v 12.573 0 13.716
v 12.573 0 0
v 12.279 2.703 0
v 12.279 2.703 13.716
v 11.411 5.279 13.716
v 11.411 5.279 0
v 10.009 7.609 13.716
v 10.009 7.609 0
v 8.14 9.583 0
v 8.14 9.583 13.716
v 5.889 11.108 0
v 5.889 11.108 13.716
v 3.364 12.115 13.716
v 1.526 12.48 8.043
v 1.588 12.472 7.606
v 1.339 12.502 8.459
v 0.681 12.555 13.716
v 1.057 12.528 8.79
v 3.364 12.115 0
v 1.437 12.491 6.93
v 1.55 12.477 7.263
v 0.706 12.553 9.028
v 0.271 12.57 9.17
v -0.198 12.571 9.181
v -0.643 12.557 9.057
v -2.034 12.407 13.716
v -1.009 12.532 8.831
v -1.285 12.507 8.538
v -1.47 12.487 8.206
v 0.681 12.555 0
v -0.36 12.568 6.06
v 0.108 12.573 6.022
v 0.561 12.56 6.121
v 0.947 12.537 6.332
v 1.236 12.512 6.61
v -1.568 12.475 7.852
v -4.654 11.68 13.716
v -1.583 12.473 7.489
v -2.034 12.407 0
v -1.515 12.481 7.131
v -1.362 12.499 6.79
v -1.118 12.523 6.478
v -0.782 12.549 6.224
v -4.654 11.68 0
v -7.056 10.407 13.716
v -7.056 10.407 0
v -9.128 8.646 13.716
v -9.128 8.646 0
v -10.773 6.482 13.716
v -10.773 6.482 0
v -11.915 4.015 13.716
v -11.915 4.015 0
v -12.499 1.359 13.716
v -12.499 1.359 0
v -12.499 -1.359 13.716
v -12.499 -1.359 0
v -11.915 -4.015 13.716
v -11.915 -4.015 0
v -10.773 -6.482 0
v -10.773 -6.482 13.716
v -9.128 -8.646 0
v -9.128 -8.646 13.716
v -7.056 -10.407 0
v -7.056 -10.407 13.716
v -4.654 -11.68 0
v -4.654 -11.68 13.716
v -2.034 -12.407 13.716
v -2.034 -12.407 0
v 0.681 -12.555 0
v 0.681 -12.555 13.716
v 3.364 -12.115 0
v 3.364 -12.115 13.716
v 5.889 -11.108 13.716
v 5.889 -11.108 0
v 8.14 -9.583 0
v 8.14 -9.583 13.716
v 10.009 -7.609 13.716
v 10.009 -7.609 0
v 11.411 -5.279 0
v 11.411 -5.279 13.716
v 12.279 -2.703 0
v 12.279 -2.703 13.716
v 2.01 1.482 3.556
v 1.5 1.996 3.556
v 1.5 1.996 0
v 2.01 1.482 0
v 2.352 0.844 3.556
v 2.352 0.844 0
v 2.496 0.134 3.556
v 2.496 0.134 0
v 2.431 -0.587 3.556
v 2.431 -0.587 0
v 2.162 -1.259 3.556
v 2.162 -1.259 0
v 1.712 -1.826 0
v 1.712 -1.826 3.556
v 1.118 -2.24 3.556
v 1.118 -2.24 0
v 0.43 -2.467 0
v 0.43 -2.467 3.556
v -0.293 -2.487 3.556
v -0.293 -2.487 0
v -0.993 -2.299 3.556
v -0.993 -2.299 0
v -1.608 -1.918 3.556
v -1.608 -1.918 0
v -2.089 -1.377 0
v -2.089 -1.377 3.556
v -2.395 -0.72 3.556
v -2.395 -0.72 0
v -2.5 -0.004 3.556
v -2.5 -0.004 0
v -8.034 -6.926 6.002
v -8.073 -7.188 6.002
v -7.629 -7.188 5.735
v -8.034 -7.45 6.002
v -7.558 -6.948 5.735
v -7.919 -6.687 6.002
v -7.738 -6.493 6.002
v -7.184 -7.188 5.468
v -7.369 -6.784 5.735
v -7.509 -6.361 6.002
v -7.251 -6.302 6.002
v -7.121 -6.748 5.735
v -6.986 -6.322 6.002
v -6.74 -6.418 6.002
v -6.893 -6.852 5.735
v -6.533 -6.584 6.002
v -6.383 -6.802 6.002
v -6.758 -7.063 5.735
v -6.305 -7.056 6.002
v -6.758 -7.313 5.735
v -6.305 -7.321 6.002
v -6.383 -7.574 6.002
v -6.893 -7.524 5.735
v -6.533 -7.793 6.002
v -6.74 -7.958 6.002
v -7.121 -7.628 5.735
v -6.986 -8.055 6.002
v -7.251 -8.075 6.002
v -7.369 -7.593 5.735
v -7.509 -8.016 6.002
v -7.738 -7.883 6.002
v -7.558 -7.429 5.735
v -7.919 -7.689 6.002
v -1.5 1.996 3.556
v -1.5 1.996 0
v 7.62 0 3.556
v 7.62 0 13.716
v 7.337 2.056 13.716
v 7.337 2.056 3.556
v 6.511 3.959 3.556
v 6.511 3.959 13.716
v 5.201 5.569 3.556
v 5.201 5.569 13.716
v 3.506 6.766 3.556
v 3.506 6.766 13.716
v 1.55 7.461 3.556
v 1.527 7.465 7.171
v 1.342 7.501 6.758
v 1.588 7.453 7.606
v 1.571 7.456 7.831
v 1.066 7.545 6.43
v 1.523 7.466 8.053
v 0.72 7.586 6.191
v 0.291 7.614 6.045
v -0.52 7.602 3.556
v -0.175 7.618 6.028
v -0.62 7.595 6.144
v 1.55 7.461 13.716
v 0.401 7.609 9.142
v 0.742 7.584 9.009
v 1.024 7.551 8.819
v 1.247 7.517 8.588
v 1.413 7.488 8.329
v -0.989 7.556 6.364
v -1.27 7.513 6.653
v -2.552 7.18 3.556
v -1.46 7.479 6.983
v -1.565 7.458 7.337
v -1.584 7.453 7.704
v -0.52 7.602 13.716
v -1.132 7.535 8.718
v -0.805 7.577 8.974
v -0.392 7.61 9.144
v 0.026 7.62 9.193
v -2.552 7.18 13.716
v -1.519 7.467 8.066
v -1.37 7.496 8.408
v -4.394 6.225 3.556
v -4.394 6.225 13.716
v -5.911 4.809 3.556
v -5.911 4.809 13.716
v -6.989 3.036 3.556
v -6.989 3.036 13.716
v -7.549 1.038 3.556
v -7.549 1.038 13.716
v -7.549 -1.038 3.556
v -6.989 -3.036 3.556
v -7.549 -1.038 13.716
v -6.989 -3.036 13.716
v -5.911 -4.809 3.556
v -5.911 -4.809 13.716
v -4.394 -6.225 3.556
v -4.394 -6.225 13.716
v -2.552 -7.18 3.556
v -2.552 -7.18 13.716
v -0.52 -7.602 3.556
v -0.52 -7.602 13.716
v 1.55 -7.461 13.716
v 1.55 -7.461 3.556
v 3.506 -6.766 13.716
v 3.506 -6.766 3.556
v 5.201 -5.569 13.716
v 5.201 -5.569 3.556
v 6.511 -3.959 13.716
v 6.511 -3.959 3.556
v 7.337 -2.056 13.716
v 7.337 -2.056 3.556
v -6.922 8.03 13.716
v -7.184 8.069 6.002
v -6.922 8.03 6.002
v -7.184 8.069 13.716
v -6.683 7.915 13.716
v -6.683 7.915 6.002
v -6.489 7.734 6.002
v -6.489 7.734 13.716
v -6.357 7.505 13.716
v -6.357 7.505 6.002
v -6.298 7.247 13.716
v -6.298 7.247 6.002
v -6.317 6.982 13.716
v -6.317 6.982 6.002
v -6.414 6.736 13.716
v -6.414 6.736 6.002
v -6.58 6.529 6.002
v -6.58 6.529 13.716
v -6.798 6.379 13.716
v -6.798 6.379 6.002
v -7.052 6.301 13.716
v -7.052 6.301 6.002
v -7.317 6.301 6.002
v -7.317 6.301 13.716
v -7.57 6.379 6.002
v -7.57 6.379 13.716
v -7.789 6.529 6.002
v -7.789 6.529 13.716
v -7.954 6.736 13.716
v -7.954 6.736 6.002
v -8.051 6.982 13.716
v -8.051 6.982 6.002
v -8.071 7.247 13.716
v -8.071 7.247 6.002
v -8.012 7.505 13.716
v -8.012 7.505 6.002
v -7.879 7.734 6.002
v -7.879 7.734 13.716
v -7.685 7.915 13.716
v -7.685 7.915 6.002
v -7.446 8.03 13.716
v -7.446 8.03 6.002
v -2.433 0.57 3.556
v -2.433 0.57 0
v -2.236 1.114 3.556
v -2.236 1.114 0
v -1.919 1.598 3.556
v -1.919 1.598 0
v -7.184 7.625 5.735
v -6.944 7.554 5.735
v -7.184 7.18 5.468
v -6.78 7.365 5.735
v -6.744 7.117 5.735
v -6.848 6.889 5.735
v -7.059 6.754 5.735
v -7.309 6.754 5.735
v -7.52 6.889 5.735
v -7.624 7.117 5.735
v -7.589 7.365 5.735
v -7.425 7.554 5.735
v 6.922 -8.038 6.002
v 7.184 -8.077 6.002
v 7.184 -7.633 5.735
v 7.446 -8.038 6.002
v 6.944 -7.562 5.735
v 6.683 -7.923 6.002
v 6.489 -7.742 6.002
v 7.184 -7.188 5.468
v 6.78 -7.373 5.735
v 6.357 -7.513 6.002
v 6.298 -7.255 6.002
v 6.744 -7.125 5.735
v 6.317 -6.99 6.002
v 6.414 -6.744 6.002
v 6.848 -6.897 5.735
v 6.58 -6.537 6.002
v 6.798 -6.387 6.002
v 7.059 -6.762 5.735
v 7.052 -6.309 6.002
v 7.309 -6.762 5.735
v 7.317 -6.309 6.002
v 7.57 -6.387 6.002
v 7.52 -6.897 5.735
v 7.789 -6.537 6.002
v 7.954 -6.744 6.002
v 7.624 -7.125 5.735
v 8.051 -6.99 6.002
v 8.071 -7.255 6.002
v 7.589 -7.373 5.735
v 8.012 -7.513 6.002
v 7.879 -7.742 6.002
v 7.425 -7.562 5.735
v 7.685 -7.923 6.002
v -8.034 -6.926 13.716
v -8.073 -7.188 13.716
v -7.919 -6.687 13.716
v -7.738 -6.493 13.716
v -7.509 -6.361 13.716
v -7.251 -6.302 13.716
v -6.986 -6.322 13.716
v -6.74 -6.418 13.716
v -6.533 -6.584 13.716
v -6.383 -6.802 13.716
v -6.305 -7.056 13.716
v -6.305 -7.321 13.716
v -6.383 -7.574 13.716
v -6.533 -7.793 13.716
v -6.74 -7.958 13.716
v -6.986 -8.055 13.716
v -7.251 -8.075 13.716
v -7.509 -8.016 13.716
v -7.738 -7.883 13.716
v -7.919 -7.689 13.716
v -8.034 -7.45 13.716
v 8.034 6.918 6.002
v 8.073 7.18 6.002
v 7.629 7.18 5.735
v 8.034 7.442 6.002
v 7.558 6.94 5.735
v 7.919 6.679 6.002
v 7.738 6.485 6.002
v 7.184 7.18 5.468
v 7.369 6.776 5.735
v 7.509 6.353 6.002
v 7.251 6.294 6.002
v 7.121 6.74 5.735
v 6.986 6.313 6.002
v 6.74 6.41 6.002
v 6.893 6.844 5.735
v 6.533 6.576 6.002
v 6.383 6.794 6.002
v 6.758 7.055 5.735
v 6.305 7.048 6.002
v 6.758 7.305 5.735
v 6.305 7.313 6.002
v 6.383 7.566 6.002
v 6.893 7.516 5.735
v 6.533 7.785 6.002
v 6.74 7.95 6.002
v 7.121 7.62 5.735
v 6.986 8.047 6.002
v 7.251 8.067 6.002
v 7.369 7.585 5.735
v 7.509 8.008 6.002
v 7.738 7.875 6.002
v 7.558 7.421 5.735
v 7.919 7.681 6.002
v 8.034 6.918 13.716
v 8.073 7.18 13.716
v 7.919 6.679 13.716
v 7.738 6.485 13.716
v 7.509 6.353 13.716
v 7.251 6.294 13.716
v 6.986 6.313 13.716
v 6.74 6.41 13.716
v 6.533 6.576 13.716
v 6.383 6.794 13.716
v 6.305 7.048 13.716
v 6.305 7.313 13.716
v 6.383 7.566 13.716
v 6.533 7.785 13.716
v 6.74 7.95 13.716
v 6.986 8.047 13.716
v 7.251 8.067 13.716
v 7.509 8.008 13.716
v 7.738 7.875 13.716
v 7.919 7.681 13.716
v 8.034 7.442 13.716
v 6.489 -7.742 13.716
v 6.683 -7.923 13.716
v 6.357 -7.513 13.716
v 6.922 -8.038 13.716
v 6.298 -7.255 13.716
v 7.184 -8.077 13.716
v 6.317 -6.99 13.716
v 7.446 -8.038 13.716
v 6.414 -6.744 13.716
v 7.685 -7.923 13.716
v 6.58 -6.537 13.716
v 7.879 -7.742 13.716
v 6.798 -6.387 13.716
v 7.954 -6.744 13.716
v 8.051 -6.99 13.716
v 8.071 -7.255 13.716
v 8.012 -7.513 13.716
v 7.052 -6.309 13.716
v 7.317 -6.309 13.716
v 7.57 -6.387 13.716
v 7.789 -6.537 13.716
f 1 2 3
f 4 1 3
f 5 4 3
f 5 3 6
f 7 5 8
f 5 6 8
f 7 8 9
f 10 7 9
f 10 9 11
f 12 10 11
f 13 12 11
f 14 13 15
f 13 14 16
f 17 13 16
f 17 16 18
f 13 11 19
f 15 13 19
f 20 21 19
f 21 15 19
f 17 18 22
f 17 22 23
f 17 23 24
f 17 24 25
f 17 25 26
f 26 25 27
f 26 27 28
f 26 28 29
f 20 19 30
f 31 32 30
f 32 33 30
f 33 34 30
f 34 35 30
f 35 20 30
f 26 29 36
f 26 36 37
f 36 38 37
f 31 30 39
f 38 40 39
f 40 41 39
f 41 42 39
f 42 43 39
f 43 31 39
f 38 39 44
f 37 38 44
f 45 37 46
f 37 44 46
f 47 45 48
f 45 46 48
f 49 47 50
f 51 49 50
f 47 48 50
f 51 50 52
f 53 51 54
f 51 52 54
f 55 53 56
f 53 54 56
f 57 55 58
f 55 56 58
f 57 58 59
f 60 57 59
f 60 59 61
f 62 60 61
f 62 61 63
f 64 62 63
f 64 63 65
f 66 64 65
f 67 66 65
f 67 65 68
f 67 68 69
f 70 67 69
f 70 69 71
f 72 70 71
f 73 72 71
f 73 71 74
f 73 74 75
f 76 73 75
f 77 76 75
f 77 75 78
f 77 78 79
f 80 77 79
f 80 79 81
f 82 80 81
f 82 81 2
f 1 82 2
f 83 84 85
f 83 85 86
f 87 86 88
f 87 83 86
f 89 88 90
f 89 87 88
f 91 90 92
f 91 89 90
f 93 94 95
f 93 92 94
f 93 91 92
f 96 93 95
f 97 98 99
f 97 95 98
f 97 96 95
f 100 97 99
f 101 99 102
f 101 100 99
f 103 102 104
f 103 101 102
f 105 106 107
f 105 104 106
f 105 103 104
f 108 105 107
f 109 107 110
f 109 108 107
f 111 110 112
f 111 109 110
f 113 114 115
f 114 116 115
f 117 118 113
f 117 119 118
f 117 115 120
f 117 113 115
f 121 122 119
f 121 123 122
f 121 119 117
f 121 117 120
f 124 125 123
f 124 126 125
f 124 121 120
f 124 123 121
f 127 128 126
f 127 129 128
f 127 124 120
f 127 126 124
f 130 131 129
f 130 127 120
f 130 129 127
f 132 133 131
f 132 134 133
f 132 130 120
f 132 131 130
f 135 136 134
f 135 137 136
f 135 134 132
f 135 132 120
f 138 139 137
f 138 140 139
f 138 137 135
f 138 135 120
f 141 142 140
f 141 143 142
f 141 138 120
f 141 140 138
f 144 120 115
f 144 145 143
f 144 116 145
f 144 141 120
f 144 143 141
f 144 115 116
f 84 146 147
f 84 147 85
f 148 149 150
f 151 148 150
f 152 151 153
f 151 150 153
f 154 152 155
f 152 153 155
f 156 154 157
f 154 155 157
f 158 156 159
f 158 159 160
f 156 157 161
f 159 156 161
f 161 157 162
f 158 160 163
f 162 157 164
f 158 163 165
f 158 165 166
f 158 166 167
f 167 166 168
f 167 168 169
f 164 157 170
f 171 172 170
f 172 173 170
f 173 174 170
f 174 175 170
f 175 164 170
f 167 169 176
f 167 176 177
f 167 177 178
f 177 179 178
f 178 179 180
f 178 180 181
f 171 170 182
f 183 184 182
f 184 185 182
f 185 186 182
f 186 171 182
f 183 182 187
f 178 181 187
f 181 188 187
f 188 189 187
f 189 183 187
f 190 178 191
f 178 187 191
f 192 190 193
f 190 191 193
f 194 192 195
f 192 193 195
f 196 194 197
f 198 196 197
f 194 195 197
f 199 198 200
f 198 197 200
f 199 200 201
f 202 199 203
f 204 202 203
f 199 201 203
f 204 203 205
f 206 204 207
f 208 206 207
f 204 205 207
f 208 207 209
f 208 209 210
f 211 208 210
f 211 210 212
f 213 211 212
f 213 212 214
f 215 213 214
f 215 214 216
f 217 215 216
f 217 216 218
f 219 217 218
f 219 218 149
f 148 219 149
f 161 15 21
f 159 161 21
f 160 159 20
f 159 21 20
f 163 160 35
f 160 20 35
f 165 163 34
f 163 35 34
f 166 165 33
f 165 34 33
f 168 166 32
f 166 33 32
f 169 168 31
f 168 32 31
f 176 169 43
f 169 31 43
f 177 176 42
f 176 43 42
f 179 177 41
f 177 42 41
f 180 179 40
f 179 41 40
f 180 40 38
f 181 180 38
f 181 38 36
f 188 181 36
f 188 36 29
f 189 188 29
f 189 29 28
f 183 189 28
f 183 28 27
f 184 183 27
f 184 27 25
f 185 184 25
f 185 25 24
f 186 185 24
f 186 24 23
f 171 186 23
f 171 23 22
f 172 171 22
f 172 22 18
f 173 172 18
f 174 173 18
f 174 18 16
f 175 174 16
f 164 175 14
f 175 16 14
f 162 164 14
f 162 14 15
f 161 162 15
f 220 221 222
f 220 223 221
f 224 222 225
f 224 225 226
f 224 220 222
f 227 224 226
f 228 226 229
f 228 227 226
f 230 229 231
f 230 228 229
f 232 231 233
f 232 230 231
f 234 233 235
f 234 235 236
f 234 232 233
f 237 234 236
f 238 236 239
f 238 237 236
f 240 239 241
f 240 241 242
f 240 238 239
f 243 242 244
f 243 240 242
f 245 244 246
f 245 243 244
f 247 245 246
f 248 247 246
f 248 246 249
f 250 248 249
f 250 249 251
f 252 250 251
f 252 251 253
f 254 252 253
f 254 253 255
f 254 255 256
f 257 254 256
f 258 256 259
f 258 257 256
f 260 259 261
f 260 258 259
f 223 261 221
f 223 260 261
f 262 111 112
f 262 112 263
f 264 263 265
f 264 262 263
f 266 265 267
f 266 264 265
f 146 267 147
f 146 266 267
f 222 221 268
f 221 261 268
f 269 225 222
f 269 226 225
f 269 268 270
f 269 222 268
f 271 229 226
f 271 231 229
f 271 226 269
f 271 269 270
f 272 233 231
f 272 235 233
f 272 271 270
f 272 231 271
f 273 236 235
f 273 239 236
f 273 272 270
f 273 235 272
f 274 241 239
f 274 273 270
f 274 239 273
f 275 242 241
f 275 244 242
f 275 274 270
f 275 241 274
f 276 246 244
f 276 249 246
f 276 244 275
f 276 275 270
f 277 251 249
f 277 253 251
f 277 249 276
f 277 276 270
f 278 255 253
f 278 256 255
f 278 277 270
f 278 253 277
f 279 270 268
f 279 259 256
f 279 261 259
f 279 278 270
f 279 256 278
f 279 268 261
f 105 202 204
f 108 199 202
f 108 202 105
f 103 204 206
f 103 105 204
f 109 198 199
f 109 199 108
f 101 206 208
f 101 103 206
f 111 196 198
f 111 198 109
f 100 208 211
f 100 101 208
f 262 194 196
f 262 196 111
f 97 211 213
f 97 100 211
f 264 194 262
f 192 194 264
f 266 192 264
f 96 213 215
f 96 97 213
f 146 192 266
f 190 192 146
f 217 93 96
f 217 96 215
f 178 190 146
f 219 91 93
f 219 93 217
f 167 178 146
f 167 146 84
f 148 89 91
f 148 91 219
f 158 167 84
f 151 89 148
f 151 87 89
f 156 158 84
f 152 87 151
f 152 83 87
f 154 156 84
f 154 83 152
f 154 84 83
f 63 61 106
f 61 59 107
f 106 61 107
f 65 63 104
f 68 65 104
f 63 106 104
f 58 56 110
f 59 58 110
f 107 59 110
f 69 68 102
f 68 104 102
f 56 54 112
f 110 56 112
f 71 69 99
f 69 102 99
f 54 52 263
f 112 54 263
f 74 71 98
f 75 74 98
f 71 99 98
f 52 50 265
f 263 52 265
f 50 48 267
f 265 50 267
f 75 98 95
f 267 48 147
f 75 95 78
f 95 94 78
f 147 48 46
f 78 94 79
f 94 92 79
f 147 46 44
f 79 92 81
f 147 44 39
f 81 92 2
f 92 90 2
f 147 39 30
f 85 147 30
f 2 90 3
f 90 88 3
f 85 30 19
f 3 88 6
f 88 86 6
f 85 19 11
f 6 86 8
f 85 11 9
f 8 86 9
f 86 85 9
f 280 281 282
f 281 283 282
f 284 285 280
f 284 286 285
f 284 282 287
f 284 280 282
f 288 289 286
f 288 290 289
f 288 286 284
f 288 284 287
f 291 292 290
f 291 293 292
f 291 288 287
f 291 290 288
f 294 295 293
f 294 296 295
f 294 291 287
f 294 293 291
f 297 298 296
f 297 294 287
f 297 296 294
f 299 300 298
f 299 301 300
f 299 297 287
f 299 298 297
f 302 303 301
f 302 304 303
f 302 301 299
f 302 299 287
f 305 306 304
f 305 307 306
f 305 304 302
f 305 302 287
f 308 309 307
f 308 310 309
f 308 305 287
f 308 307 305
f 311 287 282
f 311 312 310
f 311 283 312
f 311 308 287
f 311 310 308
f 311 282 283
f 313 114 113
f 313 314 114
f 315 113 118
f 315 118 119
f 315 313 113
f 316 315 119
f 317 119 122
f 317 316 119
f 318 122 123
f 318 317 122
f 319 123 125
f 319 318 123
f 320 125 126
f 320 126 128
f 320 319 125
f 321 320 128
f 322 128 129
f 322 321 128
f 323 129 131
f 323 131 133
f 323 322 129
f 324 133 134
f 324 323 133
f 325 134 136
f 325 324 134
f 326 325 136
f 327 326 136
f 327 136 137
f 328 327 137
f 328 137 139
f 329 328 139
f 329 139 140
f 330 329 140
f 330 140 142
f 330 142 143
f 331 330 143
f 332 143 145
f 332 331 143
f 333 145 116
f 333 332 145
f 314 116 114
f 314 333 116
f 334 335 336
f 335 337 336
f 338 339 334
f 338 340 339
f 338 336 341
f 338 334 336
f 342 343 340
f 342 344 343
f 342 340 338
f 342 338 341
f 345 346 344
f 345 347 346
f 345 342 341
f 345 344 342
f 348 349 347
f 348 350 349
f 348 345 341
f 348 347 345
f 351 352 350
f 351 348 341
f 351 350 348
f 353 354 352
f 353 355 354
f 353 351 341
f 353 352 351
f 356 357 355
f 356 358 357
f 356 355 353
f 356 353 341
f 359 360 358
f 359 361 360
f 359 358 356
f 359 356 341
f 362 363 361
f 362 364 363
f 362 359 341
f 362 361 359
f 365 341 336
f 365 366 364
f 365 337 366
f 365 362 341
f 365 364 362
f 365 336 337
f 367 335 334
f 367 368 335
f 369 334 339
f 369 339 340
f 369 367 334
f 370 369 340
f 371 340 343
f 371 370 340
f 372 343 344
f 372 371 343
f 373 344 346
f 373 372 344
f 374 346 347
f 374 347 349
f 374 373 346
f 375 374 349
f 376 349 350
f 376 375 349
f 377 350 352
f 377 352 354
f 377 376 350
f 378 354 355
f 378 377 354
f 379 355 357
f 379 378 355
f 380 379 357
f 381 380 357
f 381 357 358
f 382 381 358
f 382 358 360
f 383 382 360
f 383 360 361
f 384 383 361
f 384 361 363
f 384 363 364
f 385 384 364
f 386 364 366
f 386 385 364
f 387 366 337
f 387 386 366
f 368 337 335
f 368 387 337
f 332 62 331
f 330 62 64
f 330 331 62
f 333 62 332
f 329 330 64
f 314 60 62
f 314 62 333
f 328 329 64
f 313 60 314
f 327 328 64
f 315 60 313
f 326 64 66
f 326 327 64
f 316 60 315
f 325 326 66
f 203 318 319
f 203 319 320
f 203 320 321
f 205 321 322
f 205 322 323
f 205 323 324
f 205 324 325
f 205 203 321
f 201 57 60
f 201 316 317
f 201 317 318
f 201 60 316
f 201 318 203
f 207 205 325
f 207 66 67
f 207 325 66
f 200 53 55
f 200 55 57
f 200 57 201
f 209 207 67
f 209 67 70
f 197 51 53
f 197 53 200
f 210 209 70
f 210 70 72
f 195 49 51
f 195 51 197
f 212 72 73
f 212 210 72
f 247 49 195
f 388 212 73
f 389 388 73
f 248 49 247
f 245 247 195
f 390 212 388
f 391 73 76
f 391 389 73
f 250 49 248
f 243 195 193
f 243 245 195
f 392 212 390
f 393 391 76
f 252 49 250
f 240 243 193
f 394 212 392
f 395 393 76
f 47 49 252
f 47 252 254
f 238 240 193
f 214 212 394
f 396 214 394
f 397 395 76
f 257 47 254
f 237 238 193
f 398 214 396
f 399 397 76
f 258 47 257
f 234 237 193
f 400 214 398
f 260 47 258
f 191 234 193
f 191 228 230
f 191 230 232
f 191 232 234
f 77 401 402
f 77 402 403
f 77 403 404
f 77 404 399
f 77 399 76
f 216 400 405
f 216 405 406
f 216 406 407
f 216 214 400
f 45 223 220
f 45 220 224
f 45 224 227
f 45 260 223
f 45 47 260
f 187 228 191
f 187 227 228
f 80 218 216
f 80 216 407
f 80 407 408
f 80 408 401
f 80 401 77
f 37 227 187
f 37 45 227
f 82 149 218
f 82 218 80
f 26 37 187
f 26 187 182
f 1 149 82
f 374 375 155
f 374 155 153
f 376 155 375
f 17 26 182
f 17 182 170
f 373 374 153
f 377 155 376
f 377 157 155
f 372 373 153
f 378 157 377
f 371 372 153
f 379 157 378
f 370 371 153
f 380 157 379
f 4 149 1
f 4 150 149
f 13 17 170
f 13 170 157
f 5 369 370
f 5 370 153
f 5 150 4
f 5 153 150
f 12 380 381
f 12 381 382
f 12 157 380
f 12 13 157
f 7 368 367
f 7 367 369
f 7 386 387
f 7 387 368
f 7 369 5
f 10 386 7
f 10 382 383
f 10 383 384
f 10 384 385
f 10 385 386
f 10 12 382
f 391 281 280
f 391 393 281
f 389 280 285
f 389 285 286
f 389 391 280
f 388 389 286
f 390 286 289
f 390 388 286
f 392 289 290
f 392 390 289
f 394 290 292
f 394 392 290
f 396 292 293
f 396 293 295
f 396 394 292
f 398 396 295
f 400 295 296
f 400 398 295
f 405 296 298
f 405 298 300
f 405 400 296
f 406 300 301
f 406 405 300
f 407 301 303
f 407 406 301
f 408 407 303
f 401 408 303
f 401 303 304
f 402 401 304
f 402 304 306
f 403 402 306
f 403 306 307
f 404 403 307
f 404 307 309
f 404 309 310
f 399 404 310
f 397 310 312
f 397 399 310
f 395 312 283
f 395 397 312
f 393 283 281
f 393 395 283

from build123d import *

# Parameters (mm, degrees)
SKETCH1_R                       = 12.573
BOSS_EXTRUDE1_DEPTH             = 13.716
SKETCH2_R                       = 7.62
CUT_EXTRUDE1_DEPTH              = 10.16
F_1_8_0_1250_DOWEL_HOLE1_REACH  = 31.128
F_1_8_0_1250_DOWEL_HOLE1_BORE_R = 1.5875
CUT_EXTRUDE3_DEPTH              = 10
CUT_EXTRUDE3_DEPTH_BACK         = 10.16
CIRPATTERN1_COUNT               = 4


with BuildPart() as part:
    # Sketch1 → Boss-Extrude1 (new body)
    with BuildSketch(Plane.XY):
        Circle(SKETCH1_R)
    extrude(amount=BOSS_EXTRUDE1_DEPTH)

    # Sketch2 → Cut-Extrude1 (cut)
    with BuildSketch(Plane.XY.offset(13.716)):
        Circle(SKETCH2_R)
    extrude(amount=-CUT_EXTRUDE1_DEPTH, mode=Mode.SUBTRACT)

    # 1/8 (0.1250) Dowel Hole1 bore → 1/8 (0.1250) Dowel Hole1 (cut, up to next)
    with BuildSketch(Plane(origin=(0, 12.573, 7.62), x_dir=(1, 0, 0), z_dir=(0, 1, 0)), mode=Mode.PRIVATE) as f_1_8_0_1250_dowel_hole1_sk1:
        with Locations((0, 0.014313547)):
            Circle(F_1_8_0_1250_DOWEL_HOLE1_BORE_R)
    f_1_8_0_1250_dowel_hole1_tool1 = extrude(f_1_8_0_1250_dowel_hole1_sk1.sketch, amount=-F_1_8_0_1250_DOWEL_HOLE1_REACH, mode=Mode.PRIVATE) & part.part
    add(f_1_8_0_1250_dowel_hole1_tool1.solids().sort_by_distance((0, 12.573, 7.605686))[0], mode=Mode.SUBTRACT)

    # Sketch5 → Cut-Extrude3 (cut, two sides)
    with BuildSketch(Plane(origin=(0, 0, 7.62), x_dir=(-1, 0, 0), z_dir=(0, 0, -1))) as cut_extrude3_sk:
        with BuildLine():
            Line((1.5, 1.99598875), (-1.5, 1.99598875))
            ThreePointArc((-1.5, 1.99598875), (-1.118033989, -2.240079228), (2.5, -0.00401125))
            ThreePointArc((2.5, -0.00401125), (2.236067977, 1.114022739), (1.5, 1.99598875))
        make_face()
    extrude(amount=CUT_EXTRUDE3_DEPTH, mode=Mode.SUBTRACT)
    extrude(cut_extrude3_sk.sketch, amount=-CUT_EXTRUDE3_DEPTH_BACK, mode=Mode.SUBTRACT)

    # Sketch15 → #2-56 Tapped Hole1 (revolve, cut)
    with BuildSketch(Plane(origin=(7.184204897, -7.188216147, 13.716), x_dir=(0, -1, 0), z_dir=(1, 0, 0))):
        Polygon((0, 0), (0, 8.24814509), (0.889, 7.71398), (0.889, 0), align=None)
    f_2_56_tapped_hole1 = revolve(axis=Axis((7.184204897, -7.188216147, 20.066), (0, 0, -1)), mode=Mode.SUBTRACT)

    # CirPattern1: #2-56 Tapped Hole1 ×4 about axis
    cirpattern1_axis = Axis((0, -0.00401125, 0), (0, 0, 1))
    for i in range(1, CIRPATTERN1_COUNT):
        add(f_2_56_tapped_hole1.rotate(cirpattern1_axis, i * 360 / CIRPATTERN1_COUNT), mode=Mode.SUBTRACT)


solid = part.part
